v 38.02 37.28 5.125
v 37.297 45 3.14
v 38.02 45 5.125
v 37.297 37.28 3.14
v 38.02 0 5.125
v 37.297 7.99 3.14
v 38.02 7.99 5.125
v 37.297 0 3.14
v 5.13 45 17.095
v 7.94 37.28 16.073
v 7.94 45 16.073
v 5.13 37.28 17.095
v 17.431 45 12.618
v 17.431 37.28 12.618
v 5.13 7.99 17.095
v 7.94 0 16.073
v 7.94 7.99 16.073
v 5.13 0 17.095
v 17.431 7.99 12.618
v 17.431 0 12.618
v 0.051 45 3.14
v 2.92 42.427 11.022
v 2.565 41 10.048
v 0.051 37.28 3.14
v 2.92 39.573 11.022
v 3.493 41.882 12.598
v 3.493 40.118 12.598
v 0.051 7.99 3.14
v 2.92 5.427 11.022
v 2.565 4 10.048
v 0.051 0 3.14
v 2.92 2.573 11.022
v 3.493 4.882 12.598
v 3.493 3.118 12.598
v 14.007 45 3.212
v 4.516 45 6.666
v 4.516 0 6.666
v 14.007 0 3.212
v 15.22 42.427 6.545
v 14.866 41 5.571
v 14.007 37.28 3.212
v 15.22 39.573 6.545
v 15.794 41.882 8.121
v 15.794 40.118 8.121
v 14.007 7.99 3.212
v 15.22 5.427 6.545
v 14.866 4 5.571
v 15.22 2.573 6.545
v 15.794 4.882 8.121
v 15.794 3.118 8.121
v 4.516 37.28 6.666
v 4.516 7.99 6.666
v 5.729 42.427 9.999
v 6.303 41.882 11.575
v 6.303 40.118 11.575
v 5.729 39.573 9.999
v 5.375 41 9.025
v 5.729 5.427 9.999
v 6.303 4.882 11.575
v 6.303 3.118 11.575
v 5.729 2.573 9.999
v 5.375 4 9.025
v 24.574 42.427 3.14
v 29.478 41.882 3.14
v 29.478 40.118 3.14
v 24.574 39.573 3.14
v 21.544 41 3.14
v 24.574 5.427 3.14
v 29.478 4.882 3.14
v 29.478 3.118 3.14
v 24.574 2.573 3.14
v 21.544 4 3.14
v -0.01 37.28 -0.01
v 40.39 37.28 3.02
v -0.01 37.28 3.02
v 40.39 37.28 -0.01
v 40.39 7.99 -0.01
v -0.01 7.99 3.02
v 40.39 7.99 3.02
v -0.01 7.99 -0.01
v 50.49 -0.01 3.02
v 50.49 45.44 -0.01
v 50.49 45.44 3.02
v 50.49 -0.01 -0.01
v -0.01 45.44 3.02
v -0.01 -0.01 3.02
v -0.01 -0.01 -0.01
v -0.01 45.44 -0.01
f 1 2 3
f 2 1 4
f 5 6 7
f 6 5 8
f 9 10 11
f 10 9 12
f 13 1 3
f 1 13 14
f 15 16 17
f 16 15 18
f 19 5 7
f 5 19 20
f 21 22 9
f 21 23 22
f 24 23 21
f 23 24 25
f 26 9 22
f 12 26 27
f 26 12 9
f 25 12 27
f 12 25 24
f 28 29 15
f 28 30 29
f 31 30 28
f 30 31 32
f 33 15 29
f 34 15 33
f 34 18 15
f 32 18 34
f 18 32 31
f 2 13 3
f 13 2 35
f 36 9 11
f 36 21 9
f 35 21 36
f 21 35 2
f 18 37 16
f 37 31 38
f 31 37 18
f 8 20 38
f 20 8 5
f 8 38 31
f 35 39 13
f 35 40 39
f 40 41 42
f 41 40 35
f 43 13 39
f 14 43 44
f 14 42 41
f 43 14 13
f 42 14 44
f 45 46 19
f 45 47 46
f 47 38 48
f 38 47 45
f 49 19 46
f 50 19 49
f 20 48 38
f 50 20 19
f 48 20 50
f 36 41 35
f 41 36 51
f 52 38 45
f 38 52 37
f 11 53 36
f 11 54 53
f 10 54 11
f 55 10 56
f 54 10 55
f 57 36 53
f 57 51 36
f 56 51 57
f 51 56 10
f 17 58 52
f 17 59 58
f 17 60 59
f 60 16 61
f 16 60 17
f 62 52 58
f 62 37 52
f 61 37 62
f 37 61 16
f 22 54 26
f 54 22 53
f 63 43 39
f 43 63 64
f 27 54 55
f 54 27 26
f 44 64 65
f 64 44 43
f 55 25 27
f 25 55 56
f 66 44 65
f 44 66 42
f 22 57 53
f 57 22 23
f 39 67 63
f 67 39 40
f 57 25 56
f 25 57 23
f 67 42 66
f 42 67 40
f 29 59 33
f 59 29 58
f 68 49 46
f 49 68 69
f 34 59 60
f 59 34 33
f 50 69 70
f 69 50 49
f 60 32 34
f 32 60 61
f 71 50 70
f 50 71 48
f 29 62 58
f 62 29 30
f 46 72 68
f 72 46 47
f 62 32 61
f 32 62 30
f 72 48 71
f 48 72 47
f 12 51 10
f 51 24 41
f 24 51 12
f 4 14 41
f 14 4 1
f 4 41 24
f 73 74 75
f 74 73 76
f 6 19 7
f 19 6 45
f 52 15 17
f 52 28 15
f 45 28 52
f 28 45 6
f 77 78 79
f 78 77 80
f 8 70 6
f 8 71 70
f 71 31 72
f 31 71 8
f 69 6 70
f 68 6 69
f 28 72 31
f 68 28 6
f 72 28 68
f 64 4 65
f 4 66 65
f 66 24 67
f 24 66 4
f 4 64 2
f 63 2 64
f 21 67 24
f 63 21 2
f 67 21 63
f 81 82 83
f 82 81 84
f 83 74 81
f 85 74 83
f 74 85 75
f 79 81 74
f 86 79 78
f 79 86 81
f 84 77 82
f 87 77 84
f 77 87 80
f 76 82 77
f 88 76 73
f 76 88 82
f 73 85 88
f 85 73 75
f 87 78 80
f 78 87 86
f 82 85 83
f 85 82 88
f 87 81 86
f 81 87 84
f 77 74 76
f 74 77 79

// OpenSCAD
// translate([]) scale cube difference
//cube([1,1,1], center = true);
module negCube(a,b,c) {
    translate([-0.01,-0.01,-0.01]){
      scale([1.01,1.01,1.01]){
         cube([a,b,c]);
      }
   }
}

module horizontalHole(d,x,y,z){
   rotate(90,[x,y,z]){
      cylinder(h = 200, r=(d/2), center = true);
   }
}

module legs(){
   difference(){
      rotate([0,20,0]){
         difference(){
            cube([35,45,15]);
            translate([3,0,5]){
               negCube(10,45,45);
            }
            
            translate([0,41,9]){
               horizontalHole(3,0,1,0);
            }
            
            translate([0,4,9]){
               horizontalHole(3,0,1,0);
            }
              
            translate([0,8,0]){
               negCube(35,29,15);
            }
         }
      }
      //
      translate([0,0,-15]){
         negCube(50,45,15);
      }
   }
}

difference(){
   union(){
      translate([0,0,3]){
         legs();
      }
      
      negCube(50,45,3);
   }
   
   translate([0,8,0]){
   negCube(40,29,15);
   }
}
